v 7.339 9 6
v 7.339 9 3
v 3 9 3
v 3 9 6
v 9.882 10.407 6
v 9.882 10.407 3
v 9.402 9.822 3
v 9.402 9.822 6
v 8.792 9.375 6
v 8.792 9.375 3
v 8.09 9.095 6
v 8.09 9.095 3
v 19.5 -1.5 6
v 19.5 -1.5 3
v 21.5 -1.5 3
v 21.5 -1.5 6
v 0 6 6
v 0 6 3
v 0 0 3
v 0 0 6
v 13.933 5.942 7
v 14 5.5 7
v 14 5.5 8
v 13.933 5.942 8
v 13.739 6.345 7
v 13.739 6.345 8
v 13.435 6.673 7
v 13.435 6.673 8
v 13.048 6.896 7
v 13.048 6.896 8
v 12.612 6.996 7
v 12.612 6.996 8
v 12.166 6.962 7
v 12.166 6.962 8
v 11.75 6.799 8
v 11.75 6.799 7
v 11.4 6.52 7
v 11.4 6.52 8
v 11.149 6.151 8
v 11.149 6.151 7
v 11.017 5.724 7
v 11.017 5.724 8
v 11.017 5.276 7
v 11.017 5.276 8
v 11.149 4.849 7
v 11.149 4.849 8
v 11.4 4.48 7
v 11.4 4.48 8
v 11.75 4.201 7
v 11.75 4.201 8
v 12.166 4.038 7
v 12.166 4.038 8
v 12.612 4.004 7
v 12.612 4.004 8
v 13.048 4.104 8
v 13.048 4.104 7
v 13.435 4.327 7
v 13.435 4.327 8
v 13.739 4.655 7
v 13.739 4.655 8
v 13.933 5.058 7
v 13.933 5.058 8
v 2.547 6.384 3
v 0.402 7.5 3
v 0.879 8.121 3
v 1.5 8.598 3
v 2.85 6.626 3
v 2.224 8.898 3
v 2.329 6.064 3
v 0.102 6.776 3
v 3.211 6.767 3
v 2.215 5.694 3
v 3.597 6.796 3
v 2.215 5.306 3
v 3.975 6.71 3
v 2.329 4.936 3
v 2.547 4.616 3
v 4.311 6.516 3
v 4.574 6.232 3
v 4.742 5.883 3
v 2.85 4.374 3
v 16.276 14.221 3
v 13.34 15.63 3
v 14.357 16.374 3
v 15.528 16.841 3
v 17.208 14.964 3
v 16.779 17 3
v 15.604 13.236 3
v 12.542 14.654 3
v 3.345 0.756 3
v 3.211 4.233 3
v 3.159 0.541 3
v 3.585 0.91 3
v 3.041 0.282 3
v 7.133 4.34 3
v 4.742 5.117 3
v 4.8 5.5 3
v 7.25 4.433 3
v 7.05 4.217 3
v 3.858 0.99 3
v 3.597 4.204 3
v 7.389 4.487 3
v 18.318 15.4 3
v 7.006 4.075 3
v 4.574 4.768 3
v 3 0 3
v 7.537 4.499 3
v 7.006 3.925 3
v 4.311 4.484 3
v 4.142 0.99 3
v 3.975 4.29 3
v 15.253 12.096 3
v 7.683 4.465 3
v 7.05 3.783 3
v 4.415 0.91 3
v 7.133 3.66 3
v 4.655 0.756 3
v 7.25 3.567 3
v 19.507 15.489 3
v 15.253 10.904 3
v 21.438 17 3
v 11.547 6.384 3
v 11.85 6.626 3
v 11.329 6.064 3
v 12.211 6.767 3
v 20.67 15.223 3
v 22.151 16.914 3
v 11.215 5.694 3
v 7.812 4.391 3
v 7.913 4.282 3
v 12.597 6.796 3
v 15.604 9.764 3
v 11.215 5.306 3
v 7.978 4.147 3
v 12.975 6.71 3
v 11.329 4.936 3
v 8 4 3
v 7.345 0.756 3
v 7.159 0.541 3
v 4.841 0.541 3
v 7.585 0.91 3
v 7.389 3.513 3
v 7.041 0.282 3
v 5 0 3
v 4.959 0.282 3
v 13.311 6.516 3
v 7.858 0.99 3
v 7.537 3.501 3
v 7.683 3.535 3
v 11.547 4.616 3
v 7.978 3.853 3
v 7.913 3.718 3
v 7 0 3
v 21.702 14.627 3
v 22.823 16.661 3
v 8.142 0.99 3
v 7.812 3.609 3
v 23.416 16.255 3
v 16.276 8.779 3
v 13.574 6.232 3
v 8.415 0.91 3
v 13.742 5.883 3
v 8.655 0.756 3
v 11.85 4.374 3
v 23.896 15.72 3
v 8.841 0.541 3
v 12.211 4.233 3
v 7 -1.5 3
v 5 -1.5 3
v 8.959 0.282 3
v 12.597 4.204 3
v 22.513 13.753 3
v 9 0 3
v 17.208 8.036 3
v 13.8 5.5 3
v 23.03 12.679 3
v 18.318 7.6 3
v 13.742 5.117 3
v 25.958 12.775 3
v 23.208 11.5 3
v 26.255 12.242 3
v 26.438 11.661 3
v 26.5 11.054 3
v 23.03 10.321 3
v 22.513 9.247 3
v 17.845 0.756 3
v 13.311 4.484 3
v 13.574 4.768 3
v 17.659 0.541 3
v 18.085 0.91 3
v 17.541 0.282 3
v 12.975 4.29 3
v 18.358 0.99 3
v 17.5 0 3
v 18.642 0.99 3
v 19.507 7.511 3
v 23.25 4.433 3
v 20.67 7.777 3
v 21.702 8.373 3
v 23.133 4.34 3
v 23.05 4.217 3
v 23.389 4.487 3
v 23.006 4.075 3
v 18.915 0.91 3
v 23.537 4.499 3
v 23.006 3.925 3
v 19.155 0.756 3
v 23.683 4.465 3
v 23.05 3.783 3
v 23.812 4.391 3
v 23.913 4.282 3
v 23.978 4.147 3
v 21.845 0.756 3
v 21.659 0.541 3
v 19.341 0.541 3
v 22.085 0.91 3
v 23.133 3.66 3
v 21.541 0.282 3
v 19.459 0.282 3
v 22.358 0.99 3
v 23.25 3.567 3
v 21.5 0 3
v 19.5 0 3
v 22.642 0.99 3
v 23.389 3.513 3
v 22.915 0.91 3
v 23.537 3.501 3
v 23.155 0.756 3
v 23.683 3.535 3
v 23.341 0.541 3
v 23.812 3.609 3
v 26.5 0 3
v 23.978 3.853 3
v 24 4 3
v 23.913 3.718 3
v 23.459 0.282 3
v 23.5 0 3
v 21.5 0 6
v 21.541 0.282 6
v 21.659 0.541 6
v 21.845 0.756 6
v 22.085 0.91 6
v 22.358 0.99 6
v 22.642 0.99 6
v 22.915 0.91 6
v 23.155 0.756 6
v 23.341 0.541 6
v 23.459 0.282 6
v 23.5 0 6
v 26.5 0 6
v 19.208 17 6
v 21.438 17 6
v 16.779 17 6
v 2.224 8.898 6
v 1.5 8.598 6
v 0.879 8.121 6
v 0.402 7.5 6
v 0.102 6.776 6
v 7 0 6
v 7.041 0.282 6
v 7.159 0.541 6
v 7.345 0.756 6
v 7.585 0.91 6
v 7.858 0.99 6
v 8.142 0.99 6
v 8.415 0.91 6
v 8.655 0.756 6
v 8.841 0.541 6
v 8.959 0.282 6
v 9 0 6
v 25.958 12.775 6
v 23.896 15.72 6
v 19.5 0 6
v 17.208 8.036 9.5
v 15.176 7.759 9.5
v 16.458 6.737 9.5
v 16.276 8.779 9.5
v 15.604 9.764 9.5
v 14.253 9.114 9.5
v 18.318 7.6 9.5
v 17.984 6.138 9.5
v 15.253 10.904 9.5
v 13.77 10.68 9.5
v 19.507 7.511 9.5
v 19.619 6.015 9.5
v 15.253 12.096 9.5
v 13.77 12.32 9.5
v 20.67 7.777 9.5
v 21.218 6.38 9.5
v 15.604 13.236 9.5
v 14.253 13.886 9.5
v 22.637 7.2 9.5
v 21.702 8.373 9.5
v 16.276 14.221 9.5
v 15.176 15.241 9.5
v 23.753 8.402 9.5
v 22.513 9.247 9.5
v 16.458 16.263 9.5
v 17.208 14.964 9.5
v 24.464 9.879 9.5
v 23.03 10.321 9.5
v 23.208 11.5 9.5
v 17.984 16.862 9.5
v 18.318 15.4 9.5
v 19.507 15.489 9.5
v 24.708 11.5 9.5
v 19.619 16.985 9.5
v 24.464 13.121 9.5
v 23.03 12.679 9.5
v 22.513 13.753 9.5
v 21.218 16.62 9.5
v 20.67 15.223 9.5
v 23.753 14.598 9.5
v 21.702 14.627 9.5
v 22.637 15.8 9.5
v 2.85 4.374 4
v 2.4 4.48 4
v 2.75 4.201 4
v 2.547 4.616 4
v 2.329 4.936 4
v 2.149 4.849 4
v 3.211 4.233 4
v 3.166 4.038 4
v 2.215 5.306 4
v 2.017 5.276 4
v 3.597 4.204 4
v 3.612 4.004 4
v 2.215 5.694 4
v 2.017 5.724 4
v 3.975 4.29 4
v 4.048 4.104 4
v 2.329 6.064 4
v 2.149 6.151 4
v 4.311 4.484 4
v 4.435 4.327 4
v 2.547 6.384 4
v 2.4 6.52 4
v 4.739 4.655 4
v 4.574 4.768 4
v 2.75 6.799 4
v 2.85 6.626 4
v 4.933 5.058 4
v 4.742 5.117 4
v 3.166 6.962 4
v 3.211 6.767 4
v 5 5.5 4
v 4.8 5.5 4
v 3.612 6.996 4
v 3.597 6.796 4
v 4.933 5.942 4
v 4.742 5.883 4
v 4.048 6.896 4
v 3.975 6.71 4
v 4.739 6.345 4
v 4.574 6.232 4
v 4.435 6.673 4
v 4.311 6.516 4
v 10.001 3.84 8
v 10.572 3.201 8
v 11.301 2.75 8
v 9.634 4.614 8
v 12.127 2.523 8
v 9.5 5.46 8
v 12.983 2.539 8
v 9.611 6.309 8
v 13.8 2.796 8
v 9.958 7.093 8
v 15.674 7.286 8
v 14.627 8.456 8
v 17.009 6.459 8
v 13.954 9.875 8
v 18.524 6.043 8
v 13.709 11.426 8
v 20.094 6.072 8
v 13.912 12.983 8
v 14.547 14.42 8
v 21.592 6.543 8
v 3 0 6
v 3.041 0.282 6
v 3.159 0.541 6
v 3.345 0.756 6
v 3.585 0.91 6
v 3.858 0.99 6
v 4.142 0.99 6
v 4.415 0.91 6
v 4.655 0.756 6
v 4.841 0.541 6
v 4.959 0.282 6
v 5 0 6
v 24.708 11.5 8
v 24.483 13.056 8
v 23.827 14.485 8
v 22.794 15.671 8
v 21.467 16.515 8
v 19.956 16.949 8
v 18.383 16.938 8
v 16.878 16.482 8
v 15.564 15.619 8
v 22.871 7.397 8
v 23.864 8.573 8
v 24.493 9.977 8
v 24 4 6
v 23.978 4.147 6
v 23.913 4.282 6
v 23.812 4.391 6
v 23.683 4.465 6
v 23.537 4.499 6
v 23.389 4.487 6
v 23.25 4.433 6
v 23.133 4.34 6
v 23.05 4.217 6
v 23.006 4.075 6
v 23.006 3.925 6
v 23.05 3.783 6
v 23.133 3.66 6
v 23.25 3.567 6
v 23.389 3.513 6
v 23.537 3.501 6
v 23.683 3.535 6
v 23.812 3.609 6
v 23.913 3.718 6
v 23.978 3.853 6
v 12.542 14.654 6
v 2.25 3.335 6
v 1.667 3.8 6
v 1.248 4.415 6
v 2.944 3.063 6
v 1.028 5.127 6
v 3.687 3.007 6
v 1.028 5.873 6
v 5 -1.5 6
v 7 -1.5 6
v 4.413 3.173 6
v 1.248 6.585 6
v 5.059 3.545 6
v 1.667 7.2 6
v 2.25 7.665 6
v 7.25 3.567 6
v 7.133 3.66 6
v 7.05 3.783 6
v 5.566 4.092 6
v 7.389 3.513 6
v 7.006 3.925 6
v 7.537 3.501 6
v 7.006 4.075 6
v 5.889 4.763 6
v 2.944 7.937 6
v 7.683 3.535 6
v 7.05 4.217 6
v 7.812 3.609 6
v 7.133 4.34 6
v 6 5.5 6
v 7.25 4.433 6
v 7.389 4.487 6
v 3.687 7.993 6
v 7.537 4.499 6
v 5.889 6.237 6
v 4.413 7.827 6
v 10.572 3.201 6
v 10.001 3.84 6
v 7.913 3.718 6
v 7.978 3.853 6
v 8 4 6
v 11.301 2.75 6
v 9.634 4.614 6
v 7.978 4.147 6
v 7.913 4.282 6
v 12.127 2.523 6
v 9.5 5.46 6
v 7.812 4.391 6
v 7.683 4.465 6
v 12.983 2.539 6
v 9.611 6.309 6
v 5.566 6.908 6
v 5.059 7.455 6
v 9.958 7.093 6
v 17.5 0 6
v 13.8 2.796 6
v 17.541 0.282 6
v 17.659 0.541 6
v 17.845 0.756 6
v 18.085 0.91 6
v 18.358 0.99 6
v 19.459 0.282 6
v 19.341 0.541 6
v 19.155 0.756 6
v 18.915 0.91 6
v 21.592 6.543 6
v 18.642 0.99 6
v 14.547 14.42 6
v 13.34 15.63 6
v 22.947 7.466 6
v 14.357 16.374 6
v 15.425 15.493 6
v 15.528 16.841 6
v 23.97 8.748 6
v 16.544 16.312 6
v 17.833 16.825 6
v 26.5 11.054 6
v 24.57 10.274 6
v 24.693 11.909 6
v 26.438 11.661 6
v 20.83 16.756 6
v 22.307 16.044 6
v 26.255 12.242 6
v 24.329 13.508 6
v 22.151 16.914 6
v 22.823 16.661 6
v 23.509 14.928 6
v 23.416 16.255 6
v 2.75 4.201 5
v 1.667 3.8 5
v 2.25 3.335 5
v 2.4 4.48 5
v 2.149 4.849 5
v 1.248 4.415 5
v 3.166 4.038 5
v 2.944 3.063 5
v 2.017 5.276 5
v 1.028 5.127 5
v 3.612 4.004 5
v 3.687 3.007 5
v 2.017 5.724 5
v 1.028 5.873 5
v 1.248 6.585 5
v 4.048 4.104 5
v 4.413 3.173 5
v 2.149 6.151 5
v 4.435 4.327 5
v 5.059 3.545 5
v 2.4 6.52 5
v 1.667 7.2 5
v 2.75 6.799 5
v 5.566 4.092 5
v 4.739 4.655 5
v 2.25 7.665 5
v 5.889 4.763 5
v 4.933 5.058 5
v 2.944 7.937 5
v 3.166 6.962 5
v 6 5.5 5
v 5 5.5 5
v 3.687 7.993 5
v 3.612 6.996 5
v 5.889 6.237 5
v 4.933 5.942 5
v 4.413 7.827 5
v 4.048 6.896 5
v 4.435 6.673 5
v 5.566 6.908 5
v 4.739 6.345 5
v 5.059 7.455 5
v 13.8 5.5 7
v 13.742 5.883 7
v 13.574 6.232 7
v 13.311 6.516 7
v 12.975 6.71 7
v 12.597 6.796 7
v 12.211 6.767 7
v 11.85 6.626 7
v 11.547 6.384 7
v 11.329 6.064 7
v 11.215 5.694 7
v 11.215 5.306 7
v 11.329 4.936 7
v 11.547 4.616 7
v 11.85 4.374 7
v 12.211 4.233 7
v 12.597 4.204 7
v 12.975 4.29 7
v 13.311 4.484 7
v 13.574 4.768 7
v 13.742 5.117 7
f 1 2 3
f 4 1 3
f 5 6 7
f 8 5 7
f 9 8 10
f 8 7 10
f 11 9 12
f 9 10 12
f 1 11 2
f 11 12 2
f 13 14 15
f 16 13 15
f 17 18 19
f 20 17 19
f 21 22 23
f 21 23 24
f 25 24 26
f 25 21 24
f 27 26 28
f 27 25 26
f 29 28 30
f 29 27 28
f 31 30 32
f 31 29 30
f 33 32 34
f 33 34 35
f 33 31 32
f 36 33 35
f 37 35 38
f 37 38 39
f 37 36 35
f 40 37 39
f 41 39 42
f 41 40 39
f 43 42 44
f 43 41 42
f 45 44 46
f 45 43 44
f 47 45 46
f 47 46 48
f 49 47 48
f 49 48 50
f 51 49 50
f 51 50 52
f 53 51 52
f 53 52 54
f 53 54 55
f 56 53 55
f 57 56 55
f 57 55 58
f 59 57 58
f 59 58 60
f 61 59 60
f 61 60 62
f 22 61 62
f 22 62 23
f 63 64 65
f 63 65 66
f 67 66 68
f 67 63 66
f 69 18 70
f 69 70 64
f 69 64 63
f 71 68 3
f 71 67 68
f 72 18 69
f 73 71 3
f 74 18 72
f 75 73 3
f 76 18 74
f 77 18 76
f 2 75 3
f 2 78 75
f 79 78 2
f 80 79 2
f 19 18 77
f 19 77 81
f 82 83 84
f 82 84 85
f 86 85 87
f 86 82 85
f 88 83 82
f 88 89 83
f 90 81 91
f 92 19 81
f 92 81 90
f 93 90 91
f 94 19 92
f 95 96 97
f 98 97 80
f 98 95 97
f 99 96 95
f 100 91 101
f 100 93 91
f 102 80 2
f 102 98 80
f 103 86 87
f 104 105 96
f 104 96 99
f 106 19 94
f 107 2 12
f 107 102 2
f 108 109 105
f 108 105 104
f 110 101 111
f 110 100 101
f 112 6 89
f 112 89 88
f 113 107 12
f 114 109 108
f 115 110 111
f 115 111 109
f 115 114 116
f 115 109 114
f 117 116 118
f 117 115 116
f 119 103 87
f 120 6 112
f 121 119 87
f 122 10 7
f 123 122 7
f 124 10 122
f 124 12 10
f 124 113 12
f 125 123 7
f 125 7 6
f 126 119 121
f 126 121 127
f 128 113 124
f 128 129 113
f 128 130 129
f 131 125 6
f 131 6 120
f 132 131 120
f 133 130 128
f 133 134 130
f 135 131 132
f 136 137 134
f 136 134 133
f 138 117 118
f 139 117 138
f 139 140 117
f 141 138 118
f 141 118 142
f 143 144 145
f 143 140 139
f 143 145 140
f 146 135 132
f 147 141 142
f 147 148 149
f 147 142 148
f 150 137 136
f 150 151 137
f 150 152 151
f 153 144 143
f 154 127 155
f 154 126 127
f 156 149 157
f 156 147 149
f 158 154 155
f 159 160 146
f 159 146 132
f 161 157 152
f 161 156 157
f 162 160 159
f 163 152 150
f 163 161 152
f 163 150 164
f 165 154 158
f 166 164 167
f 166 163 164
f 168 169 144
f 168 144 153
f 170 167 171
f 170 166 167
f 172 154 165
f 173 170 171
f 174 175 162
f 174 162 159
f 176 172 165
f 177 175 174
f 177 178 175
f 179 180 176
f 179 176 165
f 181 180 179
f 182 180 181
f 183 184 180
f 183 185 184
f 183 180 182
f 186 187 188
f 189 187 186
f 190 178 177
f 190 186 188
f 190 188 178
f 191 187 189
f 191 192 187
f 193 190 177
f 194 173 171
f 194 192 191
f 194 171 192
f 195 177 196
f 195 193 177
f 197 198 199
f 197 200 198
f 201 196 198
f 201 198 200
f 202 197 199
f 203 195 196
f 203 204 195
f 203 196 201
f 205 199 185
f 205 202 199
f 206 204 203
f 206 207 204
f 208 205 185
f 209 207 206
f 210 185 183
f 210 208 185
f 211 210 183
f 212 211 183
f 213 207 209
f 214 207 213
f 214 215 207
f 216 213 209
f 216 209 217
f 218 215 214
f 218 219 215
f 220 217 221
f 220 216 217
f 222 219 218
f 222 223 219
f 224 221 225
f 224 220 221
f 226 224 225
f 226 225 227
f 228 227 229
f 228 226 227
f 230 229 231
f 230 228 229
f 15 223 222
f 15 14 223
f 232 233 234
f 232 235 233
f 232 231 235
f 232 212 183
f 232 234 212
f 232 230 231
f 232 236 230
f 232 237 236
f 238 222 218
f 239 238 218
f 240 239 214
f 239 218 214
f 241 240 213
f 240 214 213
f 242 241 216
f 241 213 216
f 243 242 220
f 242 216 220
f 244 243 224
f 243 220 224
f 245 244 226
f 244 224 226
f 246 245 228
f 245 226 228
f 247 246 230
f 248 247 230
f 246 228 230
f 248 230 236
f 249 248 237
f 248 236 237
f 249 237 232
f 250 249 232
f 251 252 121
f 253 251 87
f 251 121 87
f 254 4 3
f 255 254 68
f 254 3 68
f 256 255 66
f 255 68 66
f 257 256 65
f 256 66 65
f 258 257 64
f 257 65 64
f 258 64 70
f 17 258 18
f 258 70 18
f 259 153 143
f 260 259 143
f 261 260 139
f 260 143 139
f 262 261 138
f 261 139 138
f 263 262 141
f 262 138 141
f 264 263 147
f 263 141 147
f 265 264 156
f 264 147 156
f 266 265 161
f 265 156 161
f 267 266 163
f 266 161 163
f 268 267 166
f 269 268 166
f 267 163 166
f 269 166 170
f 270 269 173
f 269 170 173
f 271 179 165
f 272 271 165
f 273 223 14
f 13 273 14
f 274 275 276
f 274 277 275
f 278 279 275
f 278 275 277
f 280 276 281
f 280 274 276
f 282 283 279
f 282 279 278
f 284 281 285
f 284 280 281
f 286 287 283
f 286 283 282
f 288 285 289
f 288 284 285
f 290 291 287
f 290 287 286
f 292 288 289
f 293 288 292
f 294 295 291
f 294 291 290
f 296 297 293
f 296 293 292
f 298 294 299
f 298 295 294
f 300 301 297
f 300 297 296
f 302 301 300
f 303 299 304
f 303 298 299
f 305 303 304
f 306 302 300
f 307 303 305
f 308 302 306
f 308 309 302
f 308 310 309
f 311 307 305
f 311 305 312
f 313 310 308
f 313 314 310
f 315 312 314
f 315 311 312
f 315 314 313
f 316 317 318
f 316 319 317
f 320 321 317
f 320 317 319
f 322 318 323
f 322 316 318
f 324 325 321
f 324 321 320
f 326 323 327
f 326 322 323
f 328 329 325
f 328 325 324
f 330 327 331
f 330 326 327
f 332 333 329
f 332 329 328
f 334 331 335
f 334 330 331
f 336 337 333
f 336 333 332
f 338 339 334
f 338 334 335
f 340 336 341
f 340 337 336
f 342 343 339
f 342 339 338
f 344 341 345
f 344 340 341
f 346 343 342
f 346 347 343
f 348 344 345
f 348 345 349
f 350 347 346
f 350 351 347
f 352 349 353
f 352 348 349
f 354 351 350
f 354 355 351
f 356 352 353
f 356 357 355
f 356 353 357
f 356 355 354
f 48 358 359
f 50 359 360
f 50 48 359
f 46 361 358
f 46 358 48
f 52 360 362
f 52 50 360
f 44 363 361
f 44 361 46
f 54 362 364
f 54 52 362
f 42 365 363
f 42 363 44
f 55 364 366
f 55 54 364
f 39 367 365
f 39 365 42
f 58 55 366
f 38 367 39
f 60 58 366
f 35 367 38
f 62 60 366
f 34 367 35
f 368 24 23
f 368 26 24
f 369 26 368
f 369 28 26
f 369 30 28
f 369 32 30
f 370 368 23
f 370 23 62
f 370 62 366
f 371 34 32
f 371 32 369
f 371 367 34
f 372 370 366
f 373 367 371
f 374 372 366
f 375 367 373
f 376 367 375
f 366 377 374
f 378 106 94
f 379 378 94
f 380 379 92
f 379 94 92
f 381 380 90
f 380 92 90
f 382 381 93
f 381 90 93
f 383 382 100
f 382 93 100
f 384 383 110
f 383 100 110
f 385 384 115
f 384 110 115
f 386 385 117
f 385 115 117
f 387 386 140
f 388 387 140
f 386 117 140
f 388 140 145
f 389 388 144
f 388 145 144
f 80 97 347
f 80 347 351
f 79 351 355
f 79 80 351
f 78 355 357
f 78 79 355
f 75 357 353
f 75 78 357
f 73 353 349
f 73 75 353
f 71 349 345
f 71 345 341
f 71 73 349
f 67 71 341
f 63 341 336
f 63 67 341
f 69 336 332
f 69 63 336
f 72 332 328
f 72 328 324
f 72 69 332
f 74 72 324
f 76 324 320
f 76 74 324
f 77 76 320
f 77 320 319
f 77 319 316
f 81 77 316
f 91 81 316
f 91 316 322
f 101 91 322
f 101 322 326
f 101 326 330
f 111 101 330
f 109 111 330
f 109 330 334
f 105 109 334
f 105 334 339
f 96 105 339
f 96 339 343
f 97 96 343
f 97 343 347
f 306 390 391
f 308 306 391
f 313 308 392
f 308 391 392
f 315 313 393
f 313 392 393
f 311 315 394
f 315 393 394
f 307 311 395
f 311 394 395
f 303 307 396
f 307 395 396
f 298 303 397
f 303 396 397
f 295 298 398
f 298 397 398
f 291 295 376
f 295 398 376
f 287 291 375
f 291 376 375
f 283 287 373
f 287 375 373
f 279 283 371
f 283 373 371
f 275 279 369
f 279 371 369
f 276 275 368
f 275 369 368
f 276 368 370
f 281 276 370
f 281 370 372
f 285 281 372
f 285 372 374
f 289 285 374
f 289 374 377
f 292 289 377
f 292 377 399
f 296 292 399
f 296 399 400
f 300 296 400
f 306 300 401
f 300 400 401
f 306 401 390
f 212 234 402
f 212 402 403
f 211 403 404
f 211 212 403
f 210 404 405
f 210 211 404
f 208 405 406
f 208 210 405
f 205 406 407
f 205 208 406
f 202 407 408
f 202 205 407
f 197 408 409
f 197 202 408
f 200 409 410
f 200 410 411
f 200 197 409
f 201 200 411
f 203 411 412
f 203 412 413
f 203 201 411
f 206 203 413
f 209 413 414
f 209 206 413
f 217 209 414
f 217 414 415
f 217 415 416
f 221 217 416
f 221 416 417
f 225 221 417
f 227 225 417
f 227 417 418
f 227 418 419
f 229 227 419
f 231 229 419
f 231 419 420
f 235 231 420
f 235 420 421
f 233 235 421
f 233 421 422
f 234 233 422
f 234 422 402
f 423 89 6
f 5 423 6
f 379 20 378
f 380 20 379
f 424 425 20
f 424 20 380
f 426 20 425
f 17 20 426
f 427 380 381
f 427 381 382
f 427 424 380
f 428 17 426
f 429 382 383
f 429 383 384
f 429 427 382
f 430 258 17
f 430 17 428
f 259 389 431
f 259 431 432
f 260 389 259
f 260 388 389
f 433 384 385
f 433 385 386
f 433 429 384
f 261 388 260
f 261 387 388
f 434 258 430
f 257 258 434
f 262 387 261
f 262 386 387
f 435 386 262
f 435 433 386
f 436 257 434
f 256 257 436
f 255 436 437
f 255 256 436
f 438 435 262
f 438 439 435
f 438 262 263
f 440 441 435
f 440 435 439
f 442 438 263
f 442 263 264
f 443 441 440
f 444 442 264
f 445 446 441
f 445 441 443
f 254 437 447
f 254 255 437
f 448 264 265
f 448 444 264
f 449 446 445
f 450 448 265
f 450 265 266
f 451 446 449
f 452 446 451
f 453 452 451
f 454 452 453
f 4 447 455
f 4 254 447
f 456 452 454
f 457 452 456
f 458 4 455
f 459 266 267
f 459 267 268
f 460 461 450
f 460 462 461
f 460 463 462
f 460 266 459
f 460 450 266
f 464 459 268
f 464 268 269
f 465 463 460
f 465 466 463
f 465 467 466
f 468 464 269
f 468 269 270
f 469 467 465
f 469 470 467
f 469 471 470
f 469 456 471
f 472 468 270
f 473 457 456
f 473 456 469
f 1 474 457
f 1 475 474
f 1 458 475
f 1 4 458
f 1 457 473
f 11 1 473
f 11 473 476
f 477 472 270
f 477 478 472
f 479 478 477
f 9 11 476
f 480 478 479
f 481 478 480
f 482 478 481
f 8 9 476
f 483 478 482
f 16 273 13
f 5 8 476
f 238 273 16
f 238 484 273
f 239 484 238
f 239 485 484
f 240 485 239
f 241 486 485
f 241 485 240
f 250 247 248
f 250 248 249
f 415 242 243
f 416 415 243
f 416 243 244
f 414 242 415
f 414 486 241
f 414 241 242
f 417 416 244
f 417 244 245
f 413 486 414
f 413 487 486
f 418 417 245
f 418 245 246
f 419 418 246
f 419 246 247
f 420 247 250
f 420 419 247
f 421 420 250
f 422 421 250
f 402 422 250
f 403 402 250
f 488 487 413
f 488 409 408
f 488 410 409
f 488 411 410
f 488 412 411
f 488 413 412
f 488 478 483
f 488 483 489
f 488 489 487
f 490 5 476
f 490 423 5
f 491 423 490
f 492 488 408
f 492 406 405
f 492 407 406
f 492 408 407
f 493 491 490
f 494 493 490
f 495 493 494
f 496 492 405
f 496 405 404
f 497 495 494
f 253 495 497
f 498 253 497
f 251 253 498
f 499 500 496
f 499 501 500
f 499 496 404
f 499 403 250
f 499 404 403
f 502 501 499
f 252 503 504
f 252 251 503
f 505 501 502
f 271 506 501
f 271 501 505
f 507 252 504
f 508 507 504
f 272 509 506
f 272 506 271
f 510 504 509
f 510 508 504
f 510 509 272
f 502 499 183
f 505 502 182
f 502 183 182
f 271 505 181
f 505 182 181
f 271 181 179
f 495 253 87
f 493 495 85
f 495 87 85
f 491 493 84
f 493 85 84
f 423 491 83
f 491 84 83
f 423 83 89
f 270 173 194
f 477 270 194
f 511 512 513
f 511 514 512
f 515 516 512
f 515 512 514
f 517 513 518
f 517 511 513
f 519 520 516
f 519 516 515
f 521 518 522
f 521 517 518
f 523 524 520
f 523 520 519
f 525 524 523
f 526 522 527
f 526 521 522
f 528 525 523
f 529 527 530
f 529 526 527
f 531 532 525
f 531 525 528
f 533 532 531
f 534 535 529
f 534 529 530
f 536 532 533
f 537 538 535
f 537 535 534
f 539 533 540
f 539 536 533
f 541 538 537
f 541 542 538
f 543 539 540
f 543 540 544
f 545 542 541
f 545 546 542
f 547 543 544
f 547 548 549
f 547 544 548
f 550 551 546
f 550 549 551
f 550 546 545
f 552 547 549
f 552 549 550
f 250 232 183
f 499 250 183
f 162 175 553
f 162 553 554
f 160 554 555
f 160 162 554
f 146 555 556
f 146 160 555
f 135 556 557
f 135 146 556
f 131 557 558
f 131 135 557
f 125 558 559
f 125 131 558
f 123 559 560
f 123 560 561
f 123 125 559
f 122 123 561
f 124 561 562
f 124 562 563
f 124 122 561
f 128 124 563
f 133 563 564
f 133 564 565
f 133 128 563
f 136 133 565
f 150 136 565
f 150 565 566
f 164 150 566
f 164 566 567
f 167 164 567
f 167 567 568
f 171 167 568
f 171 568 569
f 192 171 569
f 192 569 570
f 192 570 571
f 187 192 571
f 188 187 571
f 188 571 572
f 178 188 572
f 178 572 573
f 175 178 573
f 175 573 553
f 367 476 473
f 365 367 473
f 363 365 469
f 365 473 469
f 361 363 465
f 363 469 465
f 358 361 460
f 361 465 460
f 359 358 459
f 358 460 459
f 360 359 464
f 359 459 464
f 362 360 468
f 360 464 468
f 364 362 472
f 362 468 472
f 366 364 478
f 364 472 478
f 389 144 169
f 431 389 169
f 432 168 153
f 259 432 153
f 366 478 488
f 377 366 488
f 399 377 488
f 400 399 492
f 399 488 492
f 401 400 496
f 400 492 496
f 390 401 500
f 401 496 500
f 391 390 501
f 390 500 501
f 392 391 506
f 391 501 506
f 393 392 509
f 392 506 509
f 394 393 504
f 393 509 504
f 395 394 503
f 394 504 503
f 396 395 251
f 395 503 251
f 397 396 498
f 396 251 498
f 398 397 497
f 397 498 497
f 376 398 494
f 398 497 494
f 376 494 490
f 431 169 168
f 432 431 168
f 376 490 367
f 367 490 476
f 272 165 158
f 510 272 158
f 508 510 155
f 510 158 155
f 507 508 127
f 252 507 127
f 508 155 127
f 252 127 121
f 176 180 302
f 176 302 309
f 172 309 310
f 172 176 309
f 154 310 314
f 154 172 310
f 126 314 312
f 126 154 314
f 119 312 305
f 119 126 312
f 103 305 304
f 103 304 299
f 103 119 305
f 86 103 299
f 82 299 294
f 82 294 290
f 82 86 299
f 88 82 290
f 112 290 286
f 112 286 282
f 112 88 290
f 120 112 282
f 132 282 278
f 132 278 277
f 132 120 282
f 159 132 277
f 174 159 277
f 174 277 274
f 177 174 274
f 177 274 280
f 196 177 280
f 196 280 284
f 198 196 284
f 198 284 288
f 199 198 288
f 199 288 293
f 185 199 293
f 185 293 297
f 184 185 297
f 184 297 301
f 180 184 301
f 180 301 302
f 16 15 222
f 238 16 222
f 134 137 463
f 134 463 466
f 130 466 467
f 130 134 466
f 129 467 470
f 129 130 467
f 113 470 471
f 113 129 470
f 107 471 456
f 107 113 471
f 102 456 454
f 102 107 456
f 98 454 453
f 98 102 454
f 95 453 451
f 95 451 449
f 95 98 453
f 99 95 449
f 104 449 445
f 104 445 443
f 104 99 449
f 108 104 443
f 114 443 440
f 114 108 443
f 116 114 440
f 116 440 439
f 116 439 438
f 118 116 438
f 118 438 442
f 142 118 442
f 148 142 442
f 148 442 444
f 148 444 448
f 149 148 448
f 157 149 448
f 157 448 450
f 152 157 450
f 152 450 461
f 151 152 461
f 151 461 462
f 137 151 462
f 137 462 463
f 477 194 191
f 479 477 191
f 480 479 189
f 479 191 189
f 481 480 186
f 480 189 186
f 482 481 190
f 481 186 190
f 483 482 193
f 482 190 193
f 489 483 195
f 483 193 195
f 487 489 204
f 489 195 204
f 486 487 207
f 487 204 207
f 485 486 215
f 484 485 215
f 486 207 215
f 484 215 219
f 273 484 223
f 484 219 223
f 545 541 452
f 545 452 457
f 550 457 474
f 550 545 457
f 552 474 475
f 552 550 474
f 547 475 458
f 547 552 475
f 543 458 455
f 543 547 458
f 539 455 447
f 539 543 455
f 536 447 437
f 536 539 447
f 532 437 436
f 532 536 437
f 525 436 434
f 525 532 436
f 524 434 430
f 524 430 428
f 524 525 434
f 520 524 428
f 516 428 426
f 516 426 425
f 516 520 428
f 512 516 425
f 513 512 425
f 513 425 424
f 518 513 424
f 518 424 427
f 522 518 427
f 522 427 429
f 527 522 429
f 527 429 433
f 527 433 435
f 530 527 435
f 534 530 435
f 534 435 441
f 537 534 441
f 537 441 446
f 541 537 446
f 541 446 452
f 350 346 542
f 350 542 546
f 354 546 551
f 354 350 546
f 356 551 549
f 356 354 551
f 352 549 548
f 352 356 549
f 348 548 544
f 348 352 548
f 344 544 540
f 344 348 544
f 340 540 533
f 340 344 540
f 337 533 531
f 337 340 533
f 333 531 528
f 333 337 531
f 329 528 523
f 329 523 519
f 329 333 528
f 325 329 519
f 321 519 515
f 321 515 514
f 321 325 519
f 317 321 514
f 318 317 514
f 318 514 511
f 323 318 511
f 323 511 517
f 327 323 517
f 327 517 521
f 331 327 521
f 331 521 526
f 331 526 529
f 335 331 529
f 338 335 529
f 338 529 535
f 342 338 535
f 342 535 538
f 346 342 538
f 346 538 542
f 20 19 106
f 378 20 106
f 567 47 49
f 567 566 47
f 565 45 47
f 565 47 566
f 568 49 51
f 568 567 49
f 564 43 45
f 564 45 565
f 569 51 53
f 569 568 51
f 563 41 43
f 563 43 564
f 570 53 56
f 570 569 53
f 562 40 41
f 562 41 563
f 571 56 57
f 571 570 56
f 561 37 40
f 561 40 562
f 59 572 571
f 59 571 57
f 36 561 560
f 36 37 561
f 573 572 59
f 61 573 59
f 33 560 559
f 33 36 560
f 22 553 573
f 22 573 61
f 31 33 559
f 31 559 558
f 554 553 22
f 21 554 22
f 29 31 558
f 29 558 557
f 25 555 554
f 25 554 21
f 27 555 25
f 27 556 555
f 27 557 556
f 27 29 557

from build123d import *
from build123d.topology import SkipClean

# Parameters (mm, degrees)
SKETCH1_W                            = 26.5
SKETCH1_H                            = 6
BOSS_EXTRUDE1_DEPTH                  = 17
SKETCH2_R                            = 1.5
CUT_EXTRUDE1_DEPTH                   = 1
SKETCH3_R                            = 1.3
CUT_EXTRUDE2_DEPTH                   = 32.878676259
SKETCH4_R                            = 4
CUT_EXTRUDE3_DEPTH                   = 33.050741021
SKETCH5_R                            = 2.5
CUT_EXTRUDE4_DEPTH                   = 1.5
SKETCH6_R                            = 1.5
CUT_EXTRUDE8_DEPTH                   = 1
SKETCH7_R                            = 1.3
CUT_EXTRUDE9_DEPTH                   = 32.678068123
CUT_EXTRUDE10_START                  = -1
SKETCH8_R                            = 2.5
CUT_EXTRUDE10_DEPTH                  = 1
CUT_EXTRUDE11_START                  = -1
SKETCH9_R                            = 1.5
CUT_EXTRUDE11_DEPTH                  = 1
SKETCH10_R                           = 5.5
SKETCH10_R_2                         = 4
BOSS_EXTRUDE2_DEPTH                  = 3.5
SKETCH11_R                           = 3
SKETCH11_R_2                         = 1.3
BOSS_EXTRUDE4_DEPTH                  = 2
CUT_EXTRUDE12_START                  = -1
SKETCH12_R                           = 1.5
CUT_EXTRUDE12_DEPTH                  = 1
SKETCH17_W                           = 2
SKETCH17_H                           = 6
BOSS_EXTRUDE6_DEPTH                  = 1.5
SKETCH18_R                           = 1
CUT_EXTRUDE17_DEPTH                  = 33.050741021
CHAMFER2_SIZE                        = 5
CHAMFER2_SIZE2                       = 3.5
FILLET11_R                           = 3
BOSS_EXTRUDE7_DEPTH                  = 2
CUT_EXTRUDE19_DEPTH                  = 33.050741021
FILLET13_R                           = 5
FILLET14_R                           = 3
FILLET15_R                           = 3
SKIZZE1_R                            = 0.5
SCHNITT_LINEAR_AUSTRAGEN1_DEPTH      = 33.050741021
SPIEGELN1_OUTLINE_R                  = 4
SPIEGELN1_OUTLINE_R_2                = 2.5
SPIEGELN1_OUTLINE_R_3                = 0.5
SPIEGELN1_OUTLINE_R_4                = 1.5
SPIEGELN1_DEPTH                      = 6
SPIEGELN1_START                      = 6
SPIEGELN1_2_OUTLINE_R                = 4
SPIEGELN1_2_OUTLINE_R_2              = 1.5
SPIEGELN1_2_DEPTH                    = 2
SPIEGELN1_START_2                    = 8
SPIEGELN1_3_OUTLINE_R                = 5.5
SPIEGELN1_3_OUTLINE_R_2              = 4
SPIEGELN1_3_DEPTH                    = 1.5
SPIEGELN1_START_3                    = 1.5
SPIEGELN1_4_OUTLINE_R                = 1.5
SPIEGELN1_4_OUTLINE_R_2              = 1.3
SPIEGELN1_4_OUTLINE_R_3              = 2.5
SPIEGELN1_4_DEPTH                    = 3.5
SPIEGELN1_START_4                    = 1
SPIEGELN1_5_OUTLINE_R                = 1.5
SPIEGELN1_5_OUTLINE_R_2              = 1.3
SPIEGELN1_5_DEPTH                    = 6
SPIEGELN1_START_5                    = 2.5
SPIEGELN1_6_OUTLINE_R                = 1.5
SPIEGELN1_6_OUTLINE_R_2              = 1.3
SPIEGELN1_6_DEPTH                    = 1.5
SCHNITT_LINEAR_AUSTRAGEN2_DEPTH      = 31.409702399
SCHNITT_LINEAR_AUSTRAGEN2_DEPTH_BACK = 31.409702399
SKIZZE2_W                            = 26.5
SKIZZE2_H                            = 9.5
SCHNITT_LINEAR_AUSTRAGEN3_DEPTH      = 31.409702399
SCHNITT_LINEAR_AUSTRAGEN3_DEPTH_BACK = 31.409702399
SKIZZE3_W                            = 26.5
SKIZZE3_H                            = 3


# Read off the part's stored shape, not the designer's step: Spiegeln1
with BuildPart() as part:
    # Sketch1 → Boss-Extrude1 (new body)
    with BuildSketch(Plane(origin=(0, 0, 0), x_dir=(1, 0, 0), z_dir=(0, 1, 0))):
        with Locations((13.25, 3)):
            Rectangle(SKETCH1_W, SKETCH1_H)
    extrude(amount=BOSS_EXTRUDE1_DEPTH)

    # Sketch2 → Cut-Extrude1 (cut)
    with BuildSketch(Plane.XY):
        with Locations((12.5, 5.5)):
            Circle(SKETCH2_R)
    extrude(amount=-CUT_EXTRUDE1_DEPTH, mode=Mode.SUBTRACT)

    # Sketch3 → Cut-Extrude2 (cut, through all)
    with BuildSketch(Plane.XY.offset(-1)):
        with Locations((12.5, 5.5)):
            Circle(SKETCH3_R)
    extrude(amount=-CUT_EXTRUDE2_DEPTH, mode=Mode.SUBTRACT)

    # Sketch4 → Cut-Extrude3 (cut, through all)
    with BuildSketch(Plane.XY):
        with Locations((19.208203932, 11.5)):
            Circle(SKETCH4_R)
    extrude(amount=-CUT_EXTRUDE3_DEPTH, mode=Mode.SUBTRACT)

    # Sketch5 → Cut-Extrude4 (cut)
    with BuildSketch(Plane.XY):
        with Locations((3.5, 5.5)):
            Circle(SKETCH5_R)
    extrude(amount=-CUT_EXTRUDE4_DEPTH, mode=Mode.SUBTRACT)

    # Sketch6 → Cut-Extrude8 (cut)
    with BuildSketch(Plane.XY.offset(-1.5)):
        with Locations((3.5, 5.5)):
            Circle(SKETCH6_R)
    extrude(amount=-CUT_EXTRUDE8_DEPTH, mode=Mode.SUBTRACT)

    # Sketch7 → Cut-Extrude9 (cut, through all)
    with BuildSketch(Plane.XY.offset(-2.5)):
        with Locations((3.5, 5.5)):
            Circle(SKETCH7_R)
    extrude(amount=-CUT_EXTRUDE9_DEPTH, mode=Mode.SUBTRACT)

    # Sketch8 → Cut-Extrude10 (cut)
    with BuildSketch(Plane(origin=(0, 0, -6), x_dir=(-1, 0, 0), z_dir=(0, 0, -1)).offset(CUT_EXTRUDE10_START)):
        with Locations(Location((-3.5, 5.5, 0), (0, 0, 180))):
            Circle(SKETCH8_R)
    extrude(amount=CUT_EXTRUDE10_DEPTH, mode=Mode.SUBTRACT)

    # Sketch9 → Cut-Extrude11 (cut)
    with BuildSketch(Plane(origin=(0, 0, -5), x_dir=(-1, 0, 0), z_dir=(0, 0, -1)).offset(CUT_EXTRUDE11_START)):
        with Locations(Location((-3.5, 5.5, 0), (0, 0, 180))):
            Circle(SKETCH9_R)
    extrude(amount=CUT_EXTRUDE11_DEPTH, mode=Mode.SUBTRACT)

    # Sketch10 → Boss-Extrude2 (add)
    with BuildSketch(Plane(origin=(0, 0, -6), x_dir=(-1, 0, 0), z_dir=(0, 0, -1))):
        with Locations(Location((-19.208203932, 11.5, 0), (0, 0, 90))):
            Circle(SKETCH10_R)
        with Locations(Location((-19.208203932, 11.5, 0), (0, 0, 180))):
            Circle(SKETCH10_R_2, mode=Mode.SUBTRACT)
    extrude(amount=BOSS_EXTRUDE2_DEPTH)

    # Sketch11 → Boss-Extrude4 (add)
    with BuildSketch(Plane(origin=(0, 0, -6), x_dir=(-1, 0, 0), z_dir=(0, 0, -1))):
        with Locations(Location((-12.5, 5.5, 0), (0, 0, 180))):
            Circle(SKETCH11_R)
        with Locations(Location((-12.5, 5.5, 0), (0, 0, 180))):
            Circle(SKETCH11_R_2, mode=Mode.SUBTRACT)
    extrude(amount=BOSS_EXTRUDE4_DEPTH)

    # Sketch12 → Cut-Extrude12 (cut)
    with BuildSketch(Plane(origin=(0, 0, -8), x_dir=(-1, 0, 0), z_dir=(0, 0, -1)).offset(CUT_EXTRUDE12_START)):
        with Locations(Location((-12.5, 5.5, 0), (0, 0, 180))):
            Circle(SKETCH12_R)
    extrude(amount=CUT_EXTRUDE12_DEPTH, mode=Mode.SUBTRACT)

    # Sketch17 → Boss-Extrude6 (add)
    with BuildSketch(Plane.XZ):
        with Locations((6, -3)):
            Rectangle(SKETCH17_W, SKETCH17_H)
        with Locations((20.5, -3)):
            Rectangle(SKETCH17_W, SKETCH17_H)
    extrude(amount=BOSS_EXTRUDE6_DEPTH)

    # Sketch18 → Cut-Extrude17 (cut, through all)
    with BuildSketch(Plane(origin=(0, 0, -6), x_dir=(-1, 0, 0), z_dir=(0, 0, -1))):
        with Locations((-22.5, 0)):
            Circle(SKETCH18_R)
        with Locations((-18.5, 0)):
            Circle(SKETCH18_R)
        with Locations((-8, 0)):
            Circle(SKETCH18_R)
        with Locations((-4, 0)):
            Circle(SKETCH18_R)
    extrude(amount=-CUT_EXTRUDE17_DEPTH, mode=Mode.SUBTRACT)

    # Chamfer2
    chamfer2_edges = [part.edges().sort_by_distance(p)[0] for p in [
        (26.5, 17, -3),
    ]]
    chamfer2_side = [part.faces().sort_by_distance(p)[0] for p in [
        (26.5, 8.5, -3),
    ]]
    chamfer(chamfer2_edges, length=CHAMFER2_SIZE, length2=CHAMFER2_SIZE2, reference=chamfer2_side[0])

    # Fillet11
    fillet11_edges = [part.edges().sort_by_distance(p)[0] for p in [
        (23, 17, -3),
        (26.5, 12, -3),
    ]]
    fillet(fillet11_edges, radius=FILLET11_R)

    # Sketch19 → Boss-Extrude7 (add)
    with BuildSketch(Plane(origin=(0, 0, -6), x_dir=(-1, 0, 0), z_dir=(0, 0, -1))):
        with BuildLine():
            Line((-14.547099294, 14.419606745), (-9.957579288, 7.09251277))
            ThreePointArc((-9.957579288, 7.09251277), (-14.736067977, 7.5), (-13.800160725, 2.796376119))
            Line((-13.800160725, 2.796376119), (-21.591831928, 6.543356218))
            ThreePointArc((-21.591831928, 6.543356218), (-15.108745974, 7.833333333), (-14.547099294, 14.419606745))
        make_face()
    extrude(amount=BOSS_EXTRUDE7_DEPTH)

    # Sketch20 → Cut-Extrude19 (cut, through all)
    with BuildSketch(Plane(origin=(0, 0, -6), x_dir=(-1, 0, 0), z_dir=(0, 0, -1))):
        Polygon((0, 17), (-14.011012575, 17), (-9, 9), (0, 9), align=None)
    extrude(amount=-CUT_EXTRUDE19_DEPTH, mode=Mode.SUBTRACT)

    # Fillet13
    fillet13_edges = [part.edges().sort_by_distance(p)[0] for p in [
        (14.011012575, 17, -3),
    ]]
    fillet(fillet13_edges, radius=FILLET13_R)

    # Fillet14
    fillet14_edges = [part.edges().sort_by_distance(p)[0] for p in [
        (9, 9, -3),
    ]]
    fillet(fillet14_edges, radius=FILLET14_R)

    # Fillet15
    fillet15_edges = [part.edges().sort_by_distance(p)[0] for p in [
        (0, 9, -3),
    ]]
    fillet(fillet15_edges, radius=FILLET15_R)

    # Skizze1 → Schnitt-Linear austragen1 (cut, through all)
    with BuildSketch(Plane(origin=(0, 0, -6), x_dir=(-1, 0, 0), z_dir=(0, 0, -1))):
        with Locations((-23.5, 4)):
            Circle(SKIZZE1_R)
        with Locations((-7.5, 4)):
            Circle(SKIZZE1_R)
    extrude(amount=-SCHNITT_LINEAR_AUSTRAGEN1_DEPTH, mode=Mode.SUBTRACT)

    # Spiegeln1 outline → Spiegeln1 (add)
    with SkipClean():  # the faces are left unmerged after this step: merging them gives an invalid solid
        with BuildSketch(Plane.XY):
            with BuildLine():
                Line((21.438033315, 17), (16.779018718, 17))
                ThreePointArc((16.779018718, 17), (14.357339523, 16.374410803), (12.541650865, 14.65418795))
                Line((12.541650865, 14.65418795), (9.881617026, 10.40748723))
                ThreePointArc((9.881617026, 10.40748723), (8.792203831, 9.375353518), (7.339196314, 9))
                Line((7.339196314, 9), (3, 9))
                ThreePointArc((3, 9), (0.878679656, 8.121320344), (0, 6))
                Line((0, 6), (0, 0))
                Line((0, 0), (3, 0))
                ThreePointArc((3, 0), (4, 1), (5, 0))
                Line((5, 0), (5, -1.5))
                Line((5, -1.5), (7, -1.5))
                Line((7, -1.5), (7, 0))
                ThreePointArc((7, 0), (8, 1), (9, 0))
                Line((9, 0), (17.5, 0))
                ThreePointArc((17.5, 0), (18.5, 1), (19.5, 0))
                Line((19.5, 0), (19.5, -1.5))
                Line((19.5, -1.5), (21.5, -1.5))
                Line((21.5, -1.5), (21.5, 0))
                ThreePointArc((21.5, 0), (22.5, 1), (23.5, 0))
                Line((23.5, 0), (26.5, 0))
                Line((26.5, 0), (26.5, 11.054333308))
                ThreePointArc((26.5, 11.054333308), (26.361213666, 11.956251462), (25.957695762, 12.774720341))
                Line((25.957695762, 12.774720341), (23.895729077, 15.720387033))
                ThreePointArc((23.895729077, 15.720387033), (22.823464458, 16.660936029), (21.438033315, 17))
            make_face()
            with Locations((19.208203932, 11.5)):
                Circle(SPIEGELN1_OUTLINE_R, mode=Mode.SUBTRACT)
            with Locations((3.5, 5.5)):
                Circle(SPIEGELN1_OUTLINE_R_2, mode=Mode.SUBTRACT)
            with Locations((7.5, 4)):
                Circle(SPIEGELN1_OUTLINE_R_3, mode=Mode.SUBTRACT)
            with Locations((23.5, 4)):
                Circle(SPIEGELN1_OUTLINE_R_3, mode=Mode.SUBTRACT)
            with Locations((12.5, 5.5)):
                Circle(SPIEGELN1_OUTLINE_R_4, mode=Mode.SUBTRACT)
        extrude(amount=SPIEGELN1_DEPTH)

    # Spiegeln1 2 outline → Spiegeln1 2 (add)
    with SkipClean():  # the faces are left unmerged after this step: merging them gives an invalid solid
        with BuildSketch(Plane.XY.offset(SPIEGELN1_START)):
            with BuildLine():
                Line((14.547099293, 14.419606745), (9.957579288, 7.09251277))
                ThreePointArc((9.957579288, 7.09251277), (10.263932023, 3.5), (13.800160725, 2.796376119))
                Line((13.800160725, 2.796376119), (21.591831928, 6.543356218))
                ThreePointArc((21.591831928, 6.543356218), (23.307661891, 15.166666667), (14.547099293, 14.419606745))
            make_face()
            with Locations((19.208203932, 11.5)):
                Circle(SPIEGELN1_2_OUTLINE_R, mode=Mode.SUBTRACT)
            with Locations((12.5, 5.5)):
                Circle(SPIEGELN1_2_OUTLINE_R_2, mode=Mode.SUBTRACT)
        extrude(amount=SPIEGELN1_2_DEPTH)

    # Spiegeln1 3 outline → Spiegeln1 3 (add)
    with SkipClean():  # the faces are left unmerged after this step: merging them gives an invalid solid
        with BuildSketch(Plane.XY.offset(SPIEGELN1_START_2)):
            with Locations((19.208203932, 11.5)):
                Circle(SPIEGELN1_3_OUTLINE_R)
            with Locations((19.208203932, 11.5)):
                Circle(SPIEGELN1_3_OUTLINE_R_2, mode=Mode.SUBTRACT)
        extrude(amount=SPIEGELN1_3_DEPTH)

    # Spiegeln1 4 outline → Spiegeln1 4 (add)
    # profile 1 of 2: a face of its own
    with SkipClean():  # the faces are left unmerged after this step: merging them gives an invalid solid
        with BuildSketch(Plane.XY.offset(SPIEGELN1_START_3)):
            with Locations((12.5, 5.5)):
                Circle(SPIEGELN1_4_OUTLINE_R)
            with Locations((12.5, 5.5)):
                Circle(SPIEGELN1_4_OUTLINE_R_2, mode=Mode.SUBTRACT)
        # profile 2 of 2: a face of its own
        with BuildSketch(Plane.XY.offset(SPIEGELN1_START_3)):
            with Locations((3.5, 5.5)):
                Circle(SPIEGELN1_4_OUTLINE_R_3)
            with Locations((3.5, 5.5)):
                Circle(SPIEGELN1_4_OUTLINE_R, mode=Mode.SUBTRACT)
        extrude(amount=SPIEGELN1_4_DEPTH)

    # Spiegeln1 5 outline → Spiegeln1 5 (add)
    with SkipClean():  # the faces are left unmerged after this step: merging them gives an invalid solid
        with BuildSketch(Plane.XY.offset(SPIEGELN1_START_4)):
            with Locations((12.5, 5.5)):
                Circle(SPIEGELN1_5_OUTLINE_R)
            with Locations((12.5, 5.5)):
                Circle(SPIEGELN1_5_OUTLINE_R_2, mode=Mode.SUBTRACT)
        extrude(amount=SPIEGELN1_5_DEPTH)

    # Spiegeln1 6 outline → Spiegeln1 6 (add)
    with SkipClean():  # the faces are left unmerged after this step: merging them gives an invalid solid
        with BuildSketch(Plane.XY.offset(SPIEGELN1_START_5)):
            with Locations((3.5, 5.5)):
                Circle(SPIEGELN1_6_OUTLINE_R)
            with Locations((3.5, 5.5)):
                Circle(SPIEGELN1_6_OUTLINE_R_2, mode=Mode.SUBTRACT)
        extrude(amount=SPIEGELN1_6_DEPTH)

    # Skizze2 → Schnitt-Linear austragen2 (cut, two sides: drawn at the far end of the back side and taken through both)
    with BuildSketch(Plane(origin=(0, 5.5, 0), x_dir=(1, 0, 0), z_dir=(0, 1, 0)).offset(-SCHNITT_LINEAR_AUSTRAGEN2_DEPTH_BACK)):
        with Locations((13.25, 4.75)):
            Rectangle(SKIZZE2_W, SKIZZE2_H)
    extrude(amount=SCHNITT_LINEAR_AUSTRAGEN2_DEPTH + SCHNITT_LINEAR_AUSTRAGEN2_DEPTH_BACK, mode=Mode.SUBTRACT)

    # Skizze3 → Schnitt-Linear austragen3 (cut, two sides: drawn at the far end of the back side and taken through both)
    with BuildSketch(Plane(origin=(0, 5.5, 0), x_dir=(1, 0, 0), z_dir=(0, 1, 0)).offset(-SCHNITT_LINEAR_AUSTRAGEN3_DEPTH_BACK)):
        with Locations((13.25, -1.5)):
            Rectangle(SKIZZE3_W, SKIZZE3_H)
    extrude(amount=SCHNITT_LINEAR_AUSTRAGEN3_DEPTH + SCHNITT_LINEAR_AUSTRAGEN3_DEPTH_BACK, mode=Mode.SUBTRACT)


solid = part.part
